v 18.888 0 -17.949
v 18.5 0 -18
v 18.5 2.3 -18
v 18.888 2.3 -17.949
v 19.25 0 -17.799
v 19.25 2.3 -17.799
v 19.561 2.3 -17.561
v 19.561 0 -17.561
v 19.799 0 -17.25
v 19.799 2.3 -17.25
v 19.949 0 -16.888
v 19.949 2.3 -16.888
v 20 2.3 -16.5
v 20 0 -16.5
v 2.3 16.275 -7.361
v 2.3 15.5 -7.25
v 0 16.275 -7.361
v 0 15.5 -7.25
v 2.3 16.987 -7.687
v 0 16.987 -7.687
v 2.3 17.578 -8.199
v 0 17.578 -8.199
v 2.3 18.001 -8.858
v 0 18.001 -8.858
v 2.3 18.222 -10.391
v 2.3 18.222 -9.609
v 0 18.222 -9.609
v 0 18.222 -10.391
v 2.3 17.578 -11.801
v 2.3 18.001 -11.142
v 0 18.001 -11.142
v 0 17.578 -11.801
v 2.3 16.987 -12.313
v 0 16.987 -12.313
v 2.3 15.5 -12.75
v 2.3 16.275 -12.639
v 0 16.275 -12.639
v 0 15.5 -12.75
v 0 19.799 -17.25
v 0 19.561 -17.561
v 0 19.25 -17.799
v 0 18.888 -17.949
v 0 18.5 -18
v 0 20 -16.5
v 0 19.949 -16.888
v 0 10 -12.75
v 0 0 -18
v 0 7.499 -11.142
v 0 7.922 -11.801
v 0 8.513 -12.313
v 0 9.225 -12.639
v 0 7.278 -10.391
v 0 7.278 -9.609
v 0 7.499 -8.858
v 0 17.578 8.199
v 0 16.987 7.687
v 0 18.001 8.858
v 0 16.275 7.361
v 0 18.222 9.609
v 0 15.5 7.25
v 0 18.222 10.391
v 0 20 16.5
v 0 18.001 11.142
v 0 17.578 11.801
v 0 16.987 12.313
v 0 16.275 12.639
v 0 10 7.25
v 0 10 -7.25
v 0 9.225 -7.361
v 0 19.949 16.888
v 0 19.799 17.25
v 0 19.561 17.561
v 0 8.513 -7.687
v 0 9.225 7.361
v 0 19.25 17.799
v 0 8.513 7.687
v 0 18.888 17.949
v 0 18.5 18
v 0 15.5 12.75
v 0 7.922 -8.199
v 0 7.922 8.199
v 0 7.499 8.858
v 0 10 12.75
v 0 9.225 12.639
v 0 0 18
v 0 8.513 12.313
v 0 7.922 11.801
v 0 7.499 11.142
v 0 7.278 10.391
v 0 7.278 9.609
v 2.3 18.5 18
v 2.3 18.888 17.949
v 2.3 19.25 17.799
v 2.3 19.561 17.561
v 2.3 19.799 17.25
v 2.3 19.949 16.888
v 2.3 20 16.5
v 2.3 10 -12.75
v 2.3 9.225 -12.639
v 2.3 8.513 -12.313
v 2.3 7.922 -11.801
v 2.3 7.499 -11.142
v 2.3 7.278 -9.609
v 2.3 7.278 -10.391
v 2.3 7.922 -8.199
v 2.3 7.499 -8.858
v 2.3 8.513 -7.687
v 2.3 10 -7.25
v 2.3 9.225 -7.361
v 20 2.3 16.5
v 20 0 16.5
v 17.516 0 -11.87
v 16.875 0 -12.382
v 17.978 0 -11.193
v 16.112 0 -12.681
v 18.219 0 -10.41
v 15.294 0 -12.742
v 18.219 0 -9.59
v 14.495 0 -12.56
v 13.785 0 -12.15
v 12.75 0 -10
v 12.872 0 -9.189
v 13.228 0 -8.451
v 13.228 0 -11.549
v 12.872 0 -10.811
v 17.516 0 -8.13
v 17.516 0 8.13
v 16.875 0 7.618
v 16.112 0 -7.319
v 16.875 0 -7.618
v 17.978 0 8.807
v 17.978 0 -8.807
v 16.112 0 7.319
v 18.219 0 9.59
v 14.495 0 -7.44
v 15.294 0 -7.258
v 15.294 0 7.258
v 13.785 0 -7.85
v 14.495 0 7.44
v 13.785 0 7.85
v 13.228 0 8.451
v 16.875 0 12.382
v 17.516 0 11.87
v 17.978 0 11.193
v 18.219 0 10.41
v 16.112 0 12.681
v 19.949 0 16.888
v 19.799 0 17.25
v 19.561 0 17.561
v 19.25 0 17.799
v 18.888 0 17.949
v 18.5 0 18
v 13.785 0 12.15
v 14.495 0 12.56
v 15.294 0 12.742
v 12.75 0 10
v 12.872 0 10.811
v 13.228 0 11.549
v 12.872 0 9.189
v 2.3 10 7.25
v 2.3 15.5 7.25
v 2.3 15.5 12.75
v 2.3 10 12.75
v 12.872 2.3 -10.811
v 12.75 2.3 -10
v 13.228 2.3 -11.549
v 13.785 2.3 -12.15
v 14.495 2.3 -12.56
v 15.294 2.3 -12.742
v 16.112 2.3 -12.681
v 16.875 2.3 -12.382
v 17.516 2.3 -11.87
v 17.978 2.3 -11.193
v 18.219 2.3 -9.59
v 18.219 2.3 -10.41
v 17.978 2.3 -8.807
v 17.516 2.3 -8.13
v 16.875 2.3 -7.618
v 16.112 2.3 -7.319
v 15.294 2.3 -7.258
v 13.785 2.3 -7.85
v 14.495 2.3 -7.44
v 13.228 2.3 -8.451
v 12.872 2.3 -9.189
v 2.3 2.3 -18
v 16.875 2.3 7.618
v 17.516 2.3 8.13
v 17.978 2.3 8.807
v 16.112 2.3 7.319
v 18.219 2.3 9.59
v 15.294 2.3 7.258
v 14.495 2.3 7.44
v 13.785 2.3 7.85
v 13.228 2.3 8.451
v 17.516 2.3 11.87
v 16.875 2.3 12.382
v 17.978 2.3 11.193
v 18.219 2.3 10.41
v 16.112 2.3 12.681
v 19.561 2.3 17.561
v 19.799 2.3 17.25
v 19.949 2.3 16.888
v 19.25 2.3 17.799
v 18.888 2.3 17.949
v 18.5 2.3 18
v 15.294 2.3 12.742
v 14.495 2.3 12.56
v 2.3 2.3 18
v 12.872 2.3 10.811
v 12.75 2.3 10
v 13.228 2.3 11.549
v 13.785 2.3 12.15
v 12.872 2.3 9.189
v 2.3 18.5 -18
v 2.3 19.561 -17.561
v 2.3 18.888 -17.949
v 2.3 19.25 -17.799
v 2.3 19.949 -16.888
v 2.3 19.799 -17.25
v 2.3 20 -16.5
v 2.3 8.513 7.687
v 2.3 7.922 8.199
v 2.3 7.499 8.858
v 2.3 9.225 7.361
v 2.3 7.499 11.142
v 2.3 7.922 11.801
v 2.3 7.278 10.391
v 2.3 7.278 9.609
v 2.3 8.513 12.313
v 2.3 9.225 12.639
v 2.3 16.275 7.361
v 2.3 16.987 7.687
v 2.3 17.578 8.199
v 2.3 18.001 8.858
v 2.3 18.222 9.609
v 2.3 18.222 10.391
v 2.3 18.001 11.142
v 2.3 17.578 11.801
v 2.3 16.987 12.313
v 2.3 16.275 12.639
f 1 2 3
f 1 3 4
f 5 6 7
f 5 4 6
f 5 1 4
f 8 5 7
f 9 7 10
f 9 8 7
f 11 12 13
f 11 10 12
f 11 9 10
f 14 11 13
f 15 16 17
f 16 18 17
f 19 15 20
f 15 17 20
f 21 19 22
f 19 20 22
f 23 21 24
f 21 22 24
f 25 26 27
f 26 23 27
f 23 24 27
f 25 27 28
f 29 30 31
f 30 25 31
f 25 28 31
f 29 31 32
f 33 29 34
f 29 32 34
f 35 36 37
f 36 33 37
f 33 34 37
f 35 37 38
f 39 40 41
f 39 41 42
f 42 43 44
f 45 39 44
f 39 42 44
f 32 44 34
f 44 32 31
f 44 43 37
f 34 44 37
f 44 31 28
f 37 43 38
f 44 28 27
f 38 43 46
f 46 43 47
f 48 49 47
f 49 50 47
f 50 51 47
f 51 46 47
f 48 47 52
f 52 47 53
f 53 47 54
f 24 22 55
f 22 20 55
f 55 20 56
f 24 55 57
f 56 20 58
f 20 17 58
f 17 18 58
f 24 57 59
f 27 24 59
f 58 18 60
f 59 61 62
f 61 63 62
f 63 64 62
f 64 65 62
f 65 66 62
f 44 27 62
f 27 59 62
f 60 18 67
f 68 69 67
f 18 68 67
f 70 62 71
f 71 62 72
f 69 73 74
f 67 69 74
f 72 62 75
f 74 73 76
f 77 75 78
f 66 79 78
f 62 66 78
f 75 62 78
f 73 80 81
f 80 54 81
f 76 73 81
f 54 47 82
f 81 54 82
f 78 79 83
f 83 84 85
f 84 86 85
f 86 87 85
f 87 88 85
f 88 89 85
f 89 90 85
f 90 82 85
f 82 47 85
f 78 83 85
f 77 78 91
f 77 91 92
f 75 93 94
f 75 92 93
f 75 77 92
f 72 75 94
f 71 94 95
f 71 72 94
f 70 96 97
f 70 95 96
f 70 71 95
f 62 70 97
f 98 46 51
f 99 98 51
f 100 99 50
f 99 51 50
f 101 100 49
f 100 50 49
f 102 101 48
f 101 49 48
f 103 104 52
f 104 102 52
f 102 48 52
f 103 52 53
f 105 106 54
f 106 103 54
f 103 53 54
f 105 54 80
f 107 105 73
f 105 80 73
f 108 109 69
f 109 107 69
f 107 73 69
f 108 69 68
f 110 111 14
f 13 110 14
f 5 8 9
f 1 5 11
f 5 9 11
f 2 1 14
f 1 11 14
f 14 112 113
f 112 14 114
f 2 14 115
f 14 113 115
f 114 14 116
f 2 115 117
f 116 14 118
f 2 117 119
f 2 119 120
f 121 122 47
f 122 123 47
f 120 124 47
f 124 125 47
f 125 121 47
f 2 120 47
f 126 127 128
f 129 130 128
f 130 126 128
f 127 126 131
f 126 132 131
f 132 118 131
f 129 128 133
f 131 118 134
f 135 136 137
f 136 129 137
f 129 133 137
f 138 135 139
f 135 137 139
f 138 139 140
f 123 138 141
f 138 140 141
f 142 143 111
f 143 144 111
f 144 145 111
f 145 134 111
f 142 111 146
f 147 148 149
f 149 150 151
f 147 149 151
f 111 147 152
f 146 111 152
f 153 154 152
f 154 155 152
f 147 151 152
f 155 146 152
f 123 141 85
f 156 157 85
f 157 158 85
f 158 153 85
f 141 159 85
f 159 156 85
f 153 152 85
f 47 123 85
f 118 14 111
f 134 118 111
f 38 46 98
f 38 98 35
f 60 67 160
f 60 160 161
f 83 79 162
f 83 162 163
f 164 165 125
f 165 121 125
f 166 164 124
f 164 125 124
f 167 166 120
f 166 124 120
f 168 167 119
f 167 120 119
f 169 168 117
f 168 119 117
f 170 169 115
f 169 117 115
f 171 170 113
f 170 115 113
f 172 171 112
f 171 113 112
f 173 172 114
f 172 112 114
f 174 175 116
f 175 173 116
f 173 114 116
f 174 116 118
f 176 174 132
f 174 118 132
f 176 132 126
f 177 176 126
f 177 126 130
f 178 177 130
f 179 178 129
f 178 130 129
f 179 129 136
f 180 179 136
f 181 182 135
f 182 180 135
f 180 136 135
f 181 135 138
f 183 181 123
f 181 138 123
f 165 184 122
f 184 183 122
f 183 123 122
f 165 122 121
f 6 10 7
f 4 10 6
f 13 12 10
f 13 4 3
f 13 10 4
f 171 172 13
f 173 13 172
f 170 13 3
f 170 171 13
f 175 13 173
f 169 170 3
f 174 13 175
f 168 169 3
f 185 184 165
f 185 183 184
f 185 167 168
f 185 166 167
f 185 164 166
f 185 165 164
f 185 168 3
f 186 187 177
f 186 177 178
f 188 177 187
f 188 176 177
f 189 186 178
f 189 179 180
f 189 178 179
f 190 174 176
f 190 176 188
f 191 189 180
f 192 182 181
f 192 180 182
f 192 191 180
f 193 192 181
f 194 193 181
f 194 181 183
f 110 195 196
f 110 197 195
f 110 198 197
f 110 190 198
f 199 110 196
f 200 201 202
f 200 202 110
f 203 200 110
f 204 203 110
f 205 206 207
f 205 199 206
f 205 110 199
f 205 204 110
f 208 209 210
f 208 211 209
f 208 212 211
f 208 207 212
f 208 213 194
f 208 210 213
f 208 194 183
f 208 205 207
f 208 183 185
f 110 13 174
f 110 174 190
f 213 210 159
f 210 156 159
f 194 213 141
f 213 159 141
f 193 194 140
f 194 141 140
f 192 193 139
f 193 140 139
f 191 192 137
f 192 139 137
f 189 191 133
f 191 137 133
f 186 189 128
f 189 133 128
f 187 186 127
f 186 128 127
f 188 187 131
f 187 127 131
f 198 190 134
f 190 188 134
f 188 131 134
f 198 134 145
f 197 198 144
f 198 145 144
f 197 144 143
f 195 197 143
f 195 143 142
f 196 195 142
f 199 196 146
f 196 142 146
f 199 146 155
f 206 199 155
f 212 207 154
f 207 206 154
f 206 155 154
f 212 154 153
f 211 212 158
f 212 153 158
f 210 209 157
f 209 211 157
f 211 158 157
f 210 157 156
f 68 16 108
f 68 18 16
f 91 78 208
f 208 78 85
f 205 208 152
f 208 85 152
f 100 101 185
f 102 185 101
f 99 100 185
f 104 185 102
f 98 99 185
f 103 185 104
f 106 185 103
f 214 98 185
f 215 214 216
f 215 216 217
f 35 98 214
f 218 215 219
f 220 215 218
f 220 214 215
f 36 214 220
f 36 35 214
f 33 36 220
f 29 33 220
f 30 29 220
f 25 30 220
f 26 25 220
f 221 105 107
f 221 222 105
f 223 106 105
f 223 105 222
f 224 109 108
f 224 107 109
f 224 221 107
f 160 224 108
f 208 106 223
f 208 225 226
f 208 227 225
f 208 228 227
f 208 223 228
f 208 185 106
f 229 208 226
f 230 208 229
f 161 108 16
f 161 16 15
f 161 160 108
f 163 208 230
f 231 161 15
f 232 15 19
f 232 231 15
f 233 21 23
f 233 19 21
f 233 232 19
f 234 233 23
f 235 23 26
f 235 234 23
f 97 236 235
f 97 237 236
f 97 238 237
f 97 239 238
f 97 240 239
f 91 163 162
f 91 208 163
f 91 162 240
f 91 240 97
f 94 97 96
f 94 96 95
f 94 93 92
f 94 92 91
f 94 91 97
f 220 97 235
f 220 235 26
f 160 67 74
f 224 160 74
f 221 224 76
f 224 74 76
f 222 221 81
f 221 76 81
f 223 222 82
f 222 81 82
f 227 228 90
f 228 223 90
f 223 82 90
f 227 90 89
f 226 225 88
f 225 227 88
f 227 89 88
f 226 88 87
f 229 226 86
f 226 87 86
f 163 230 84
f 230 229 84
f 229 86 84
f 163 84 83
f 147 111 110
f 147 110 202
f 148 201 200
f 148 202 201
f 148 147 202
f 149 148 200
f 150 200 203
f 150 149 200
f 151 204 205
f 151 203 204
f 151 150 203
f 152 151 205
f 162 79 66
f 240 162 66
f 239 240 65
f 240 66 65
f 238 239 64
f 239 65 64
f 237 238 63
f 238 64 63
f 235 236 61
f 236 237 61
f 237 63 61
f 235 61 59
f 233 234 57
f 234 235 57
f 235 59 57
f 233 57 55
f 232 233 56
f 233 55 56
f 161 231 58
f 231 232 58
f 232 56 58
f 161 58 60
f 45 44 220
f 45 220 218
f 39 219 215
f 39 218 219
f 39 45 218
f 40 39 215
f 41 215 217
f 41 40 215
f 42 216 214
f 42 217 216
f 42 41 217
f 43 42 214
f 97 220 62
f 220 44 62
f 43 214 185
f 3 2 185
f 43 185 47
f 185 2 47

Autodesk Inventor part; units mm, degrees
sketch "Sketch_2" plane through (0, 0, 0) normal (0, 1, 0) x (-1, 0, 0)
  line L0 (0, 18) -> (-18.5, 18)
  arc A0 (-18.5, 18) -> (-20, 16.5) centre (-18.5, 16.5) ccw
  line L1 (-20, 16.5) -> (-20, -16.5)
  arc A1 (-20, -16.5) -> (-18.5, -18) centre (-18.5, -16.5) ccw
  line L2 (-18.5, -18) -> (0, -18)
  line L3 (0, -18) -> (0, 18)
  circle A2 centre (-15.5, -10) radius 2.75
  circle A3 centre (-15.5, 10) radius 2.75
extrude "Extrusion1" add sketch "Sketch_2" along normal blind 2.3
sketch "Sketch_1" plane through (0, 0, 0) normal (1, 0, 0) x (0, 1, 0)
  line L0 (18.5, 18) -> (0, 18)
  line L1 (0, 18) -> (0, -18)
  line L2 (0, -18) -> (18.5, -18)
  arc A0 (18.5, -18) -> (20, -16.5) centre (18.5, -16.5) ccw
  line L3 (20, -16.5) -> (20, 16.5)
  arc A1 (20, 16.5) -> (18.5, 18) centre (18.5, 16.5) ccw
  line L4 (15.5, -7.25) -> (10, -7.25)
  arc A2 (10, -7.25) -> (10, -12.75) centre (10, -10) ccw
  line L5 (10, -12.75) -> (15.5, -12.75)
  arc A3 (15.5, -12.75) -> (15.5, -7.25) centre (15.5, -10) ccw
  line L6 (15.5, 12.75) -> (10, 12.75)
  arc A4 (10, 12.75) -> (10, 7.25) centre (10, 10) ccw
  line L7 (10, 7.25) -> (15.5, 7.25)
  arc A5 (15.5, 7.25) -> (15.5, 12.75) centre (15.5, 10) ccw
extrude "Extrusion2" add sketch "Sketch_1" along normal blind 2.3
ref_plane "to_cbm_1_1_XY" through (2.3, 15.5, -10) normal (1, 0, 0) x (0, 0, -1)
ref_plane "to_cbm_1_1_YZ" through (2.3, 15.5, -10) normal (0, 0, -1) x (0, 1, 0)
ref_plane "to_cbm_1_1_ZX" through (2.3, 15.5, -10) normal (0, 1, 0) x (1, 0, 0)
ref_plane "to_cbm_1_2_XY" through (2.3, 15.5, 10) normal (1, 0, 0) x (0, 0, -1)
ref_plane "to_cbm_1_2_YZ" through (2.3, 15.5, 10) normal (0, 0, -1) x (0, 1, 0)
ref_plane "to_cbm_1_2_ZX" through (2.3, 15.5, 10) normal (0, 1, 0) x (1, 0, 0)
ref_plane "to_cbm_2_1_XY" through (15.5, 2.3, 10) normal (0, 1, 0) x (1, 0, 0)
ref_plane "to_cbm_2_1_YZ" through (15.5, 2.3, 10) normal (1, 0, 0) x (0, 0, -1)
ref_plane "to_cbm_2_1_ZX" through (15.5, 2.3, 10) normal (0, 0, -1) x (0, 1, 0)
ref_plane "to_cbm_2_2_XY" through (15.5, 2.3, -10) normal (0, 1, 0) x (1, 0, 0)
ref_plane "to_cbm_2_2_YZ" through (15.5, 2.3, -10) normal (1, 0, 0) x (0, 0, -1)
ref_plane "to_cbm_2_2_ZX" through (15.5, 2.3, -10) normal (0, 0, -1) x (0, 1, 0)
ref_plane "to_hntp5_1_1_XY" through (-2, 15.5, -10) normal (-1, 0, 0) x (0, -1, 0)
ref_plane "to_hntp5_1_1_YZ" through (-2, 15.5, -10) normal (0, -1, 0) x (0, 0, 1)
ref_plane "to_hntp5_1_1_ZX" through (-2, 15.5, -10) normal (0, 0, 1) x (-1, 0, 0)
ref_plane "to_hntp5_1_2_XY" through (-2, 15.5, 10) normal (-1, 0, 0) x (0, -1, 0)
ref_plane "to_hntp5_1_2_YZ" through (-2, 15.5, 10) normal (0, -1, 0) x (0, 0, 1)
ref_plane "to_hntp5_1_2_ZX" through (-2, 15.5, 10) normal (0, 0, 1) x (-1, 0, 0)
ref_plane "to_hntp5_2_1_XY" through (15.5, -2, 10) normal (0, -1, 0) x (-1, 0, 0)
ref_plane "to_hntp5_2_1_YZ" through (15.5, -2, 10) normal (-1, 0, 0) x (0, 0, -1)
ref_plane "to_hntp5_2_1_ZX" through (15.5, -2, 10) normal (0, 0, -1) x (0, -1, 0)
ref_plane "to_hntp5_2_2_XY" through (15.5, -2, -10) normal (0, -1, 0) x (-1, 0, 0)
ref_plane "to_hntp5_2_2_YZ" through (15.5, -2, -10) normal (-1, 0, 0) x (0, 0, -1)
ref_plane "to_hntp5_2_2_ZX" through (15.5, -2, -10) normal (0, 0, -1) x (0, -1, 0)
properties part number "HPTBD5-SEP_b."
